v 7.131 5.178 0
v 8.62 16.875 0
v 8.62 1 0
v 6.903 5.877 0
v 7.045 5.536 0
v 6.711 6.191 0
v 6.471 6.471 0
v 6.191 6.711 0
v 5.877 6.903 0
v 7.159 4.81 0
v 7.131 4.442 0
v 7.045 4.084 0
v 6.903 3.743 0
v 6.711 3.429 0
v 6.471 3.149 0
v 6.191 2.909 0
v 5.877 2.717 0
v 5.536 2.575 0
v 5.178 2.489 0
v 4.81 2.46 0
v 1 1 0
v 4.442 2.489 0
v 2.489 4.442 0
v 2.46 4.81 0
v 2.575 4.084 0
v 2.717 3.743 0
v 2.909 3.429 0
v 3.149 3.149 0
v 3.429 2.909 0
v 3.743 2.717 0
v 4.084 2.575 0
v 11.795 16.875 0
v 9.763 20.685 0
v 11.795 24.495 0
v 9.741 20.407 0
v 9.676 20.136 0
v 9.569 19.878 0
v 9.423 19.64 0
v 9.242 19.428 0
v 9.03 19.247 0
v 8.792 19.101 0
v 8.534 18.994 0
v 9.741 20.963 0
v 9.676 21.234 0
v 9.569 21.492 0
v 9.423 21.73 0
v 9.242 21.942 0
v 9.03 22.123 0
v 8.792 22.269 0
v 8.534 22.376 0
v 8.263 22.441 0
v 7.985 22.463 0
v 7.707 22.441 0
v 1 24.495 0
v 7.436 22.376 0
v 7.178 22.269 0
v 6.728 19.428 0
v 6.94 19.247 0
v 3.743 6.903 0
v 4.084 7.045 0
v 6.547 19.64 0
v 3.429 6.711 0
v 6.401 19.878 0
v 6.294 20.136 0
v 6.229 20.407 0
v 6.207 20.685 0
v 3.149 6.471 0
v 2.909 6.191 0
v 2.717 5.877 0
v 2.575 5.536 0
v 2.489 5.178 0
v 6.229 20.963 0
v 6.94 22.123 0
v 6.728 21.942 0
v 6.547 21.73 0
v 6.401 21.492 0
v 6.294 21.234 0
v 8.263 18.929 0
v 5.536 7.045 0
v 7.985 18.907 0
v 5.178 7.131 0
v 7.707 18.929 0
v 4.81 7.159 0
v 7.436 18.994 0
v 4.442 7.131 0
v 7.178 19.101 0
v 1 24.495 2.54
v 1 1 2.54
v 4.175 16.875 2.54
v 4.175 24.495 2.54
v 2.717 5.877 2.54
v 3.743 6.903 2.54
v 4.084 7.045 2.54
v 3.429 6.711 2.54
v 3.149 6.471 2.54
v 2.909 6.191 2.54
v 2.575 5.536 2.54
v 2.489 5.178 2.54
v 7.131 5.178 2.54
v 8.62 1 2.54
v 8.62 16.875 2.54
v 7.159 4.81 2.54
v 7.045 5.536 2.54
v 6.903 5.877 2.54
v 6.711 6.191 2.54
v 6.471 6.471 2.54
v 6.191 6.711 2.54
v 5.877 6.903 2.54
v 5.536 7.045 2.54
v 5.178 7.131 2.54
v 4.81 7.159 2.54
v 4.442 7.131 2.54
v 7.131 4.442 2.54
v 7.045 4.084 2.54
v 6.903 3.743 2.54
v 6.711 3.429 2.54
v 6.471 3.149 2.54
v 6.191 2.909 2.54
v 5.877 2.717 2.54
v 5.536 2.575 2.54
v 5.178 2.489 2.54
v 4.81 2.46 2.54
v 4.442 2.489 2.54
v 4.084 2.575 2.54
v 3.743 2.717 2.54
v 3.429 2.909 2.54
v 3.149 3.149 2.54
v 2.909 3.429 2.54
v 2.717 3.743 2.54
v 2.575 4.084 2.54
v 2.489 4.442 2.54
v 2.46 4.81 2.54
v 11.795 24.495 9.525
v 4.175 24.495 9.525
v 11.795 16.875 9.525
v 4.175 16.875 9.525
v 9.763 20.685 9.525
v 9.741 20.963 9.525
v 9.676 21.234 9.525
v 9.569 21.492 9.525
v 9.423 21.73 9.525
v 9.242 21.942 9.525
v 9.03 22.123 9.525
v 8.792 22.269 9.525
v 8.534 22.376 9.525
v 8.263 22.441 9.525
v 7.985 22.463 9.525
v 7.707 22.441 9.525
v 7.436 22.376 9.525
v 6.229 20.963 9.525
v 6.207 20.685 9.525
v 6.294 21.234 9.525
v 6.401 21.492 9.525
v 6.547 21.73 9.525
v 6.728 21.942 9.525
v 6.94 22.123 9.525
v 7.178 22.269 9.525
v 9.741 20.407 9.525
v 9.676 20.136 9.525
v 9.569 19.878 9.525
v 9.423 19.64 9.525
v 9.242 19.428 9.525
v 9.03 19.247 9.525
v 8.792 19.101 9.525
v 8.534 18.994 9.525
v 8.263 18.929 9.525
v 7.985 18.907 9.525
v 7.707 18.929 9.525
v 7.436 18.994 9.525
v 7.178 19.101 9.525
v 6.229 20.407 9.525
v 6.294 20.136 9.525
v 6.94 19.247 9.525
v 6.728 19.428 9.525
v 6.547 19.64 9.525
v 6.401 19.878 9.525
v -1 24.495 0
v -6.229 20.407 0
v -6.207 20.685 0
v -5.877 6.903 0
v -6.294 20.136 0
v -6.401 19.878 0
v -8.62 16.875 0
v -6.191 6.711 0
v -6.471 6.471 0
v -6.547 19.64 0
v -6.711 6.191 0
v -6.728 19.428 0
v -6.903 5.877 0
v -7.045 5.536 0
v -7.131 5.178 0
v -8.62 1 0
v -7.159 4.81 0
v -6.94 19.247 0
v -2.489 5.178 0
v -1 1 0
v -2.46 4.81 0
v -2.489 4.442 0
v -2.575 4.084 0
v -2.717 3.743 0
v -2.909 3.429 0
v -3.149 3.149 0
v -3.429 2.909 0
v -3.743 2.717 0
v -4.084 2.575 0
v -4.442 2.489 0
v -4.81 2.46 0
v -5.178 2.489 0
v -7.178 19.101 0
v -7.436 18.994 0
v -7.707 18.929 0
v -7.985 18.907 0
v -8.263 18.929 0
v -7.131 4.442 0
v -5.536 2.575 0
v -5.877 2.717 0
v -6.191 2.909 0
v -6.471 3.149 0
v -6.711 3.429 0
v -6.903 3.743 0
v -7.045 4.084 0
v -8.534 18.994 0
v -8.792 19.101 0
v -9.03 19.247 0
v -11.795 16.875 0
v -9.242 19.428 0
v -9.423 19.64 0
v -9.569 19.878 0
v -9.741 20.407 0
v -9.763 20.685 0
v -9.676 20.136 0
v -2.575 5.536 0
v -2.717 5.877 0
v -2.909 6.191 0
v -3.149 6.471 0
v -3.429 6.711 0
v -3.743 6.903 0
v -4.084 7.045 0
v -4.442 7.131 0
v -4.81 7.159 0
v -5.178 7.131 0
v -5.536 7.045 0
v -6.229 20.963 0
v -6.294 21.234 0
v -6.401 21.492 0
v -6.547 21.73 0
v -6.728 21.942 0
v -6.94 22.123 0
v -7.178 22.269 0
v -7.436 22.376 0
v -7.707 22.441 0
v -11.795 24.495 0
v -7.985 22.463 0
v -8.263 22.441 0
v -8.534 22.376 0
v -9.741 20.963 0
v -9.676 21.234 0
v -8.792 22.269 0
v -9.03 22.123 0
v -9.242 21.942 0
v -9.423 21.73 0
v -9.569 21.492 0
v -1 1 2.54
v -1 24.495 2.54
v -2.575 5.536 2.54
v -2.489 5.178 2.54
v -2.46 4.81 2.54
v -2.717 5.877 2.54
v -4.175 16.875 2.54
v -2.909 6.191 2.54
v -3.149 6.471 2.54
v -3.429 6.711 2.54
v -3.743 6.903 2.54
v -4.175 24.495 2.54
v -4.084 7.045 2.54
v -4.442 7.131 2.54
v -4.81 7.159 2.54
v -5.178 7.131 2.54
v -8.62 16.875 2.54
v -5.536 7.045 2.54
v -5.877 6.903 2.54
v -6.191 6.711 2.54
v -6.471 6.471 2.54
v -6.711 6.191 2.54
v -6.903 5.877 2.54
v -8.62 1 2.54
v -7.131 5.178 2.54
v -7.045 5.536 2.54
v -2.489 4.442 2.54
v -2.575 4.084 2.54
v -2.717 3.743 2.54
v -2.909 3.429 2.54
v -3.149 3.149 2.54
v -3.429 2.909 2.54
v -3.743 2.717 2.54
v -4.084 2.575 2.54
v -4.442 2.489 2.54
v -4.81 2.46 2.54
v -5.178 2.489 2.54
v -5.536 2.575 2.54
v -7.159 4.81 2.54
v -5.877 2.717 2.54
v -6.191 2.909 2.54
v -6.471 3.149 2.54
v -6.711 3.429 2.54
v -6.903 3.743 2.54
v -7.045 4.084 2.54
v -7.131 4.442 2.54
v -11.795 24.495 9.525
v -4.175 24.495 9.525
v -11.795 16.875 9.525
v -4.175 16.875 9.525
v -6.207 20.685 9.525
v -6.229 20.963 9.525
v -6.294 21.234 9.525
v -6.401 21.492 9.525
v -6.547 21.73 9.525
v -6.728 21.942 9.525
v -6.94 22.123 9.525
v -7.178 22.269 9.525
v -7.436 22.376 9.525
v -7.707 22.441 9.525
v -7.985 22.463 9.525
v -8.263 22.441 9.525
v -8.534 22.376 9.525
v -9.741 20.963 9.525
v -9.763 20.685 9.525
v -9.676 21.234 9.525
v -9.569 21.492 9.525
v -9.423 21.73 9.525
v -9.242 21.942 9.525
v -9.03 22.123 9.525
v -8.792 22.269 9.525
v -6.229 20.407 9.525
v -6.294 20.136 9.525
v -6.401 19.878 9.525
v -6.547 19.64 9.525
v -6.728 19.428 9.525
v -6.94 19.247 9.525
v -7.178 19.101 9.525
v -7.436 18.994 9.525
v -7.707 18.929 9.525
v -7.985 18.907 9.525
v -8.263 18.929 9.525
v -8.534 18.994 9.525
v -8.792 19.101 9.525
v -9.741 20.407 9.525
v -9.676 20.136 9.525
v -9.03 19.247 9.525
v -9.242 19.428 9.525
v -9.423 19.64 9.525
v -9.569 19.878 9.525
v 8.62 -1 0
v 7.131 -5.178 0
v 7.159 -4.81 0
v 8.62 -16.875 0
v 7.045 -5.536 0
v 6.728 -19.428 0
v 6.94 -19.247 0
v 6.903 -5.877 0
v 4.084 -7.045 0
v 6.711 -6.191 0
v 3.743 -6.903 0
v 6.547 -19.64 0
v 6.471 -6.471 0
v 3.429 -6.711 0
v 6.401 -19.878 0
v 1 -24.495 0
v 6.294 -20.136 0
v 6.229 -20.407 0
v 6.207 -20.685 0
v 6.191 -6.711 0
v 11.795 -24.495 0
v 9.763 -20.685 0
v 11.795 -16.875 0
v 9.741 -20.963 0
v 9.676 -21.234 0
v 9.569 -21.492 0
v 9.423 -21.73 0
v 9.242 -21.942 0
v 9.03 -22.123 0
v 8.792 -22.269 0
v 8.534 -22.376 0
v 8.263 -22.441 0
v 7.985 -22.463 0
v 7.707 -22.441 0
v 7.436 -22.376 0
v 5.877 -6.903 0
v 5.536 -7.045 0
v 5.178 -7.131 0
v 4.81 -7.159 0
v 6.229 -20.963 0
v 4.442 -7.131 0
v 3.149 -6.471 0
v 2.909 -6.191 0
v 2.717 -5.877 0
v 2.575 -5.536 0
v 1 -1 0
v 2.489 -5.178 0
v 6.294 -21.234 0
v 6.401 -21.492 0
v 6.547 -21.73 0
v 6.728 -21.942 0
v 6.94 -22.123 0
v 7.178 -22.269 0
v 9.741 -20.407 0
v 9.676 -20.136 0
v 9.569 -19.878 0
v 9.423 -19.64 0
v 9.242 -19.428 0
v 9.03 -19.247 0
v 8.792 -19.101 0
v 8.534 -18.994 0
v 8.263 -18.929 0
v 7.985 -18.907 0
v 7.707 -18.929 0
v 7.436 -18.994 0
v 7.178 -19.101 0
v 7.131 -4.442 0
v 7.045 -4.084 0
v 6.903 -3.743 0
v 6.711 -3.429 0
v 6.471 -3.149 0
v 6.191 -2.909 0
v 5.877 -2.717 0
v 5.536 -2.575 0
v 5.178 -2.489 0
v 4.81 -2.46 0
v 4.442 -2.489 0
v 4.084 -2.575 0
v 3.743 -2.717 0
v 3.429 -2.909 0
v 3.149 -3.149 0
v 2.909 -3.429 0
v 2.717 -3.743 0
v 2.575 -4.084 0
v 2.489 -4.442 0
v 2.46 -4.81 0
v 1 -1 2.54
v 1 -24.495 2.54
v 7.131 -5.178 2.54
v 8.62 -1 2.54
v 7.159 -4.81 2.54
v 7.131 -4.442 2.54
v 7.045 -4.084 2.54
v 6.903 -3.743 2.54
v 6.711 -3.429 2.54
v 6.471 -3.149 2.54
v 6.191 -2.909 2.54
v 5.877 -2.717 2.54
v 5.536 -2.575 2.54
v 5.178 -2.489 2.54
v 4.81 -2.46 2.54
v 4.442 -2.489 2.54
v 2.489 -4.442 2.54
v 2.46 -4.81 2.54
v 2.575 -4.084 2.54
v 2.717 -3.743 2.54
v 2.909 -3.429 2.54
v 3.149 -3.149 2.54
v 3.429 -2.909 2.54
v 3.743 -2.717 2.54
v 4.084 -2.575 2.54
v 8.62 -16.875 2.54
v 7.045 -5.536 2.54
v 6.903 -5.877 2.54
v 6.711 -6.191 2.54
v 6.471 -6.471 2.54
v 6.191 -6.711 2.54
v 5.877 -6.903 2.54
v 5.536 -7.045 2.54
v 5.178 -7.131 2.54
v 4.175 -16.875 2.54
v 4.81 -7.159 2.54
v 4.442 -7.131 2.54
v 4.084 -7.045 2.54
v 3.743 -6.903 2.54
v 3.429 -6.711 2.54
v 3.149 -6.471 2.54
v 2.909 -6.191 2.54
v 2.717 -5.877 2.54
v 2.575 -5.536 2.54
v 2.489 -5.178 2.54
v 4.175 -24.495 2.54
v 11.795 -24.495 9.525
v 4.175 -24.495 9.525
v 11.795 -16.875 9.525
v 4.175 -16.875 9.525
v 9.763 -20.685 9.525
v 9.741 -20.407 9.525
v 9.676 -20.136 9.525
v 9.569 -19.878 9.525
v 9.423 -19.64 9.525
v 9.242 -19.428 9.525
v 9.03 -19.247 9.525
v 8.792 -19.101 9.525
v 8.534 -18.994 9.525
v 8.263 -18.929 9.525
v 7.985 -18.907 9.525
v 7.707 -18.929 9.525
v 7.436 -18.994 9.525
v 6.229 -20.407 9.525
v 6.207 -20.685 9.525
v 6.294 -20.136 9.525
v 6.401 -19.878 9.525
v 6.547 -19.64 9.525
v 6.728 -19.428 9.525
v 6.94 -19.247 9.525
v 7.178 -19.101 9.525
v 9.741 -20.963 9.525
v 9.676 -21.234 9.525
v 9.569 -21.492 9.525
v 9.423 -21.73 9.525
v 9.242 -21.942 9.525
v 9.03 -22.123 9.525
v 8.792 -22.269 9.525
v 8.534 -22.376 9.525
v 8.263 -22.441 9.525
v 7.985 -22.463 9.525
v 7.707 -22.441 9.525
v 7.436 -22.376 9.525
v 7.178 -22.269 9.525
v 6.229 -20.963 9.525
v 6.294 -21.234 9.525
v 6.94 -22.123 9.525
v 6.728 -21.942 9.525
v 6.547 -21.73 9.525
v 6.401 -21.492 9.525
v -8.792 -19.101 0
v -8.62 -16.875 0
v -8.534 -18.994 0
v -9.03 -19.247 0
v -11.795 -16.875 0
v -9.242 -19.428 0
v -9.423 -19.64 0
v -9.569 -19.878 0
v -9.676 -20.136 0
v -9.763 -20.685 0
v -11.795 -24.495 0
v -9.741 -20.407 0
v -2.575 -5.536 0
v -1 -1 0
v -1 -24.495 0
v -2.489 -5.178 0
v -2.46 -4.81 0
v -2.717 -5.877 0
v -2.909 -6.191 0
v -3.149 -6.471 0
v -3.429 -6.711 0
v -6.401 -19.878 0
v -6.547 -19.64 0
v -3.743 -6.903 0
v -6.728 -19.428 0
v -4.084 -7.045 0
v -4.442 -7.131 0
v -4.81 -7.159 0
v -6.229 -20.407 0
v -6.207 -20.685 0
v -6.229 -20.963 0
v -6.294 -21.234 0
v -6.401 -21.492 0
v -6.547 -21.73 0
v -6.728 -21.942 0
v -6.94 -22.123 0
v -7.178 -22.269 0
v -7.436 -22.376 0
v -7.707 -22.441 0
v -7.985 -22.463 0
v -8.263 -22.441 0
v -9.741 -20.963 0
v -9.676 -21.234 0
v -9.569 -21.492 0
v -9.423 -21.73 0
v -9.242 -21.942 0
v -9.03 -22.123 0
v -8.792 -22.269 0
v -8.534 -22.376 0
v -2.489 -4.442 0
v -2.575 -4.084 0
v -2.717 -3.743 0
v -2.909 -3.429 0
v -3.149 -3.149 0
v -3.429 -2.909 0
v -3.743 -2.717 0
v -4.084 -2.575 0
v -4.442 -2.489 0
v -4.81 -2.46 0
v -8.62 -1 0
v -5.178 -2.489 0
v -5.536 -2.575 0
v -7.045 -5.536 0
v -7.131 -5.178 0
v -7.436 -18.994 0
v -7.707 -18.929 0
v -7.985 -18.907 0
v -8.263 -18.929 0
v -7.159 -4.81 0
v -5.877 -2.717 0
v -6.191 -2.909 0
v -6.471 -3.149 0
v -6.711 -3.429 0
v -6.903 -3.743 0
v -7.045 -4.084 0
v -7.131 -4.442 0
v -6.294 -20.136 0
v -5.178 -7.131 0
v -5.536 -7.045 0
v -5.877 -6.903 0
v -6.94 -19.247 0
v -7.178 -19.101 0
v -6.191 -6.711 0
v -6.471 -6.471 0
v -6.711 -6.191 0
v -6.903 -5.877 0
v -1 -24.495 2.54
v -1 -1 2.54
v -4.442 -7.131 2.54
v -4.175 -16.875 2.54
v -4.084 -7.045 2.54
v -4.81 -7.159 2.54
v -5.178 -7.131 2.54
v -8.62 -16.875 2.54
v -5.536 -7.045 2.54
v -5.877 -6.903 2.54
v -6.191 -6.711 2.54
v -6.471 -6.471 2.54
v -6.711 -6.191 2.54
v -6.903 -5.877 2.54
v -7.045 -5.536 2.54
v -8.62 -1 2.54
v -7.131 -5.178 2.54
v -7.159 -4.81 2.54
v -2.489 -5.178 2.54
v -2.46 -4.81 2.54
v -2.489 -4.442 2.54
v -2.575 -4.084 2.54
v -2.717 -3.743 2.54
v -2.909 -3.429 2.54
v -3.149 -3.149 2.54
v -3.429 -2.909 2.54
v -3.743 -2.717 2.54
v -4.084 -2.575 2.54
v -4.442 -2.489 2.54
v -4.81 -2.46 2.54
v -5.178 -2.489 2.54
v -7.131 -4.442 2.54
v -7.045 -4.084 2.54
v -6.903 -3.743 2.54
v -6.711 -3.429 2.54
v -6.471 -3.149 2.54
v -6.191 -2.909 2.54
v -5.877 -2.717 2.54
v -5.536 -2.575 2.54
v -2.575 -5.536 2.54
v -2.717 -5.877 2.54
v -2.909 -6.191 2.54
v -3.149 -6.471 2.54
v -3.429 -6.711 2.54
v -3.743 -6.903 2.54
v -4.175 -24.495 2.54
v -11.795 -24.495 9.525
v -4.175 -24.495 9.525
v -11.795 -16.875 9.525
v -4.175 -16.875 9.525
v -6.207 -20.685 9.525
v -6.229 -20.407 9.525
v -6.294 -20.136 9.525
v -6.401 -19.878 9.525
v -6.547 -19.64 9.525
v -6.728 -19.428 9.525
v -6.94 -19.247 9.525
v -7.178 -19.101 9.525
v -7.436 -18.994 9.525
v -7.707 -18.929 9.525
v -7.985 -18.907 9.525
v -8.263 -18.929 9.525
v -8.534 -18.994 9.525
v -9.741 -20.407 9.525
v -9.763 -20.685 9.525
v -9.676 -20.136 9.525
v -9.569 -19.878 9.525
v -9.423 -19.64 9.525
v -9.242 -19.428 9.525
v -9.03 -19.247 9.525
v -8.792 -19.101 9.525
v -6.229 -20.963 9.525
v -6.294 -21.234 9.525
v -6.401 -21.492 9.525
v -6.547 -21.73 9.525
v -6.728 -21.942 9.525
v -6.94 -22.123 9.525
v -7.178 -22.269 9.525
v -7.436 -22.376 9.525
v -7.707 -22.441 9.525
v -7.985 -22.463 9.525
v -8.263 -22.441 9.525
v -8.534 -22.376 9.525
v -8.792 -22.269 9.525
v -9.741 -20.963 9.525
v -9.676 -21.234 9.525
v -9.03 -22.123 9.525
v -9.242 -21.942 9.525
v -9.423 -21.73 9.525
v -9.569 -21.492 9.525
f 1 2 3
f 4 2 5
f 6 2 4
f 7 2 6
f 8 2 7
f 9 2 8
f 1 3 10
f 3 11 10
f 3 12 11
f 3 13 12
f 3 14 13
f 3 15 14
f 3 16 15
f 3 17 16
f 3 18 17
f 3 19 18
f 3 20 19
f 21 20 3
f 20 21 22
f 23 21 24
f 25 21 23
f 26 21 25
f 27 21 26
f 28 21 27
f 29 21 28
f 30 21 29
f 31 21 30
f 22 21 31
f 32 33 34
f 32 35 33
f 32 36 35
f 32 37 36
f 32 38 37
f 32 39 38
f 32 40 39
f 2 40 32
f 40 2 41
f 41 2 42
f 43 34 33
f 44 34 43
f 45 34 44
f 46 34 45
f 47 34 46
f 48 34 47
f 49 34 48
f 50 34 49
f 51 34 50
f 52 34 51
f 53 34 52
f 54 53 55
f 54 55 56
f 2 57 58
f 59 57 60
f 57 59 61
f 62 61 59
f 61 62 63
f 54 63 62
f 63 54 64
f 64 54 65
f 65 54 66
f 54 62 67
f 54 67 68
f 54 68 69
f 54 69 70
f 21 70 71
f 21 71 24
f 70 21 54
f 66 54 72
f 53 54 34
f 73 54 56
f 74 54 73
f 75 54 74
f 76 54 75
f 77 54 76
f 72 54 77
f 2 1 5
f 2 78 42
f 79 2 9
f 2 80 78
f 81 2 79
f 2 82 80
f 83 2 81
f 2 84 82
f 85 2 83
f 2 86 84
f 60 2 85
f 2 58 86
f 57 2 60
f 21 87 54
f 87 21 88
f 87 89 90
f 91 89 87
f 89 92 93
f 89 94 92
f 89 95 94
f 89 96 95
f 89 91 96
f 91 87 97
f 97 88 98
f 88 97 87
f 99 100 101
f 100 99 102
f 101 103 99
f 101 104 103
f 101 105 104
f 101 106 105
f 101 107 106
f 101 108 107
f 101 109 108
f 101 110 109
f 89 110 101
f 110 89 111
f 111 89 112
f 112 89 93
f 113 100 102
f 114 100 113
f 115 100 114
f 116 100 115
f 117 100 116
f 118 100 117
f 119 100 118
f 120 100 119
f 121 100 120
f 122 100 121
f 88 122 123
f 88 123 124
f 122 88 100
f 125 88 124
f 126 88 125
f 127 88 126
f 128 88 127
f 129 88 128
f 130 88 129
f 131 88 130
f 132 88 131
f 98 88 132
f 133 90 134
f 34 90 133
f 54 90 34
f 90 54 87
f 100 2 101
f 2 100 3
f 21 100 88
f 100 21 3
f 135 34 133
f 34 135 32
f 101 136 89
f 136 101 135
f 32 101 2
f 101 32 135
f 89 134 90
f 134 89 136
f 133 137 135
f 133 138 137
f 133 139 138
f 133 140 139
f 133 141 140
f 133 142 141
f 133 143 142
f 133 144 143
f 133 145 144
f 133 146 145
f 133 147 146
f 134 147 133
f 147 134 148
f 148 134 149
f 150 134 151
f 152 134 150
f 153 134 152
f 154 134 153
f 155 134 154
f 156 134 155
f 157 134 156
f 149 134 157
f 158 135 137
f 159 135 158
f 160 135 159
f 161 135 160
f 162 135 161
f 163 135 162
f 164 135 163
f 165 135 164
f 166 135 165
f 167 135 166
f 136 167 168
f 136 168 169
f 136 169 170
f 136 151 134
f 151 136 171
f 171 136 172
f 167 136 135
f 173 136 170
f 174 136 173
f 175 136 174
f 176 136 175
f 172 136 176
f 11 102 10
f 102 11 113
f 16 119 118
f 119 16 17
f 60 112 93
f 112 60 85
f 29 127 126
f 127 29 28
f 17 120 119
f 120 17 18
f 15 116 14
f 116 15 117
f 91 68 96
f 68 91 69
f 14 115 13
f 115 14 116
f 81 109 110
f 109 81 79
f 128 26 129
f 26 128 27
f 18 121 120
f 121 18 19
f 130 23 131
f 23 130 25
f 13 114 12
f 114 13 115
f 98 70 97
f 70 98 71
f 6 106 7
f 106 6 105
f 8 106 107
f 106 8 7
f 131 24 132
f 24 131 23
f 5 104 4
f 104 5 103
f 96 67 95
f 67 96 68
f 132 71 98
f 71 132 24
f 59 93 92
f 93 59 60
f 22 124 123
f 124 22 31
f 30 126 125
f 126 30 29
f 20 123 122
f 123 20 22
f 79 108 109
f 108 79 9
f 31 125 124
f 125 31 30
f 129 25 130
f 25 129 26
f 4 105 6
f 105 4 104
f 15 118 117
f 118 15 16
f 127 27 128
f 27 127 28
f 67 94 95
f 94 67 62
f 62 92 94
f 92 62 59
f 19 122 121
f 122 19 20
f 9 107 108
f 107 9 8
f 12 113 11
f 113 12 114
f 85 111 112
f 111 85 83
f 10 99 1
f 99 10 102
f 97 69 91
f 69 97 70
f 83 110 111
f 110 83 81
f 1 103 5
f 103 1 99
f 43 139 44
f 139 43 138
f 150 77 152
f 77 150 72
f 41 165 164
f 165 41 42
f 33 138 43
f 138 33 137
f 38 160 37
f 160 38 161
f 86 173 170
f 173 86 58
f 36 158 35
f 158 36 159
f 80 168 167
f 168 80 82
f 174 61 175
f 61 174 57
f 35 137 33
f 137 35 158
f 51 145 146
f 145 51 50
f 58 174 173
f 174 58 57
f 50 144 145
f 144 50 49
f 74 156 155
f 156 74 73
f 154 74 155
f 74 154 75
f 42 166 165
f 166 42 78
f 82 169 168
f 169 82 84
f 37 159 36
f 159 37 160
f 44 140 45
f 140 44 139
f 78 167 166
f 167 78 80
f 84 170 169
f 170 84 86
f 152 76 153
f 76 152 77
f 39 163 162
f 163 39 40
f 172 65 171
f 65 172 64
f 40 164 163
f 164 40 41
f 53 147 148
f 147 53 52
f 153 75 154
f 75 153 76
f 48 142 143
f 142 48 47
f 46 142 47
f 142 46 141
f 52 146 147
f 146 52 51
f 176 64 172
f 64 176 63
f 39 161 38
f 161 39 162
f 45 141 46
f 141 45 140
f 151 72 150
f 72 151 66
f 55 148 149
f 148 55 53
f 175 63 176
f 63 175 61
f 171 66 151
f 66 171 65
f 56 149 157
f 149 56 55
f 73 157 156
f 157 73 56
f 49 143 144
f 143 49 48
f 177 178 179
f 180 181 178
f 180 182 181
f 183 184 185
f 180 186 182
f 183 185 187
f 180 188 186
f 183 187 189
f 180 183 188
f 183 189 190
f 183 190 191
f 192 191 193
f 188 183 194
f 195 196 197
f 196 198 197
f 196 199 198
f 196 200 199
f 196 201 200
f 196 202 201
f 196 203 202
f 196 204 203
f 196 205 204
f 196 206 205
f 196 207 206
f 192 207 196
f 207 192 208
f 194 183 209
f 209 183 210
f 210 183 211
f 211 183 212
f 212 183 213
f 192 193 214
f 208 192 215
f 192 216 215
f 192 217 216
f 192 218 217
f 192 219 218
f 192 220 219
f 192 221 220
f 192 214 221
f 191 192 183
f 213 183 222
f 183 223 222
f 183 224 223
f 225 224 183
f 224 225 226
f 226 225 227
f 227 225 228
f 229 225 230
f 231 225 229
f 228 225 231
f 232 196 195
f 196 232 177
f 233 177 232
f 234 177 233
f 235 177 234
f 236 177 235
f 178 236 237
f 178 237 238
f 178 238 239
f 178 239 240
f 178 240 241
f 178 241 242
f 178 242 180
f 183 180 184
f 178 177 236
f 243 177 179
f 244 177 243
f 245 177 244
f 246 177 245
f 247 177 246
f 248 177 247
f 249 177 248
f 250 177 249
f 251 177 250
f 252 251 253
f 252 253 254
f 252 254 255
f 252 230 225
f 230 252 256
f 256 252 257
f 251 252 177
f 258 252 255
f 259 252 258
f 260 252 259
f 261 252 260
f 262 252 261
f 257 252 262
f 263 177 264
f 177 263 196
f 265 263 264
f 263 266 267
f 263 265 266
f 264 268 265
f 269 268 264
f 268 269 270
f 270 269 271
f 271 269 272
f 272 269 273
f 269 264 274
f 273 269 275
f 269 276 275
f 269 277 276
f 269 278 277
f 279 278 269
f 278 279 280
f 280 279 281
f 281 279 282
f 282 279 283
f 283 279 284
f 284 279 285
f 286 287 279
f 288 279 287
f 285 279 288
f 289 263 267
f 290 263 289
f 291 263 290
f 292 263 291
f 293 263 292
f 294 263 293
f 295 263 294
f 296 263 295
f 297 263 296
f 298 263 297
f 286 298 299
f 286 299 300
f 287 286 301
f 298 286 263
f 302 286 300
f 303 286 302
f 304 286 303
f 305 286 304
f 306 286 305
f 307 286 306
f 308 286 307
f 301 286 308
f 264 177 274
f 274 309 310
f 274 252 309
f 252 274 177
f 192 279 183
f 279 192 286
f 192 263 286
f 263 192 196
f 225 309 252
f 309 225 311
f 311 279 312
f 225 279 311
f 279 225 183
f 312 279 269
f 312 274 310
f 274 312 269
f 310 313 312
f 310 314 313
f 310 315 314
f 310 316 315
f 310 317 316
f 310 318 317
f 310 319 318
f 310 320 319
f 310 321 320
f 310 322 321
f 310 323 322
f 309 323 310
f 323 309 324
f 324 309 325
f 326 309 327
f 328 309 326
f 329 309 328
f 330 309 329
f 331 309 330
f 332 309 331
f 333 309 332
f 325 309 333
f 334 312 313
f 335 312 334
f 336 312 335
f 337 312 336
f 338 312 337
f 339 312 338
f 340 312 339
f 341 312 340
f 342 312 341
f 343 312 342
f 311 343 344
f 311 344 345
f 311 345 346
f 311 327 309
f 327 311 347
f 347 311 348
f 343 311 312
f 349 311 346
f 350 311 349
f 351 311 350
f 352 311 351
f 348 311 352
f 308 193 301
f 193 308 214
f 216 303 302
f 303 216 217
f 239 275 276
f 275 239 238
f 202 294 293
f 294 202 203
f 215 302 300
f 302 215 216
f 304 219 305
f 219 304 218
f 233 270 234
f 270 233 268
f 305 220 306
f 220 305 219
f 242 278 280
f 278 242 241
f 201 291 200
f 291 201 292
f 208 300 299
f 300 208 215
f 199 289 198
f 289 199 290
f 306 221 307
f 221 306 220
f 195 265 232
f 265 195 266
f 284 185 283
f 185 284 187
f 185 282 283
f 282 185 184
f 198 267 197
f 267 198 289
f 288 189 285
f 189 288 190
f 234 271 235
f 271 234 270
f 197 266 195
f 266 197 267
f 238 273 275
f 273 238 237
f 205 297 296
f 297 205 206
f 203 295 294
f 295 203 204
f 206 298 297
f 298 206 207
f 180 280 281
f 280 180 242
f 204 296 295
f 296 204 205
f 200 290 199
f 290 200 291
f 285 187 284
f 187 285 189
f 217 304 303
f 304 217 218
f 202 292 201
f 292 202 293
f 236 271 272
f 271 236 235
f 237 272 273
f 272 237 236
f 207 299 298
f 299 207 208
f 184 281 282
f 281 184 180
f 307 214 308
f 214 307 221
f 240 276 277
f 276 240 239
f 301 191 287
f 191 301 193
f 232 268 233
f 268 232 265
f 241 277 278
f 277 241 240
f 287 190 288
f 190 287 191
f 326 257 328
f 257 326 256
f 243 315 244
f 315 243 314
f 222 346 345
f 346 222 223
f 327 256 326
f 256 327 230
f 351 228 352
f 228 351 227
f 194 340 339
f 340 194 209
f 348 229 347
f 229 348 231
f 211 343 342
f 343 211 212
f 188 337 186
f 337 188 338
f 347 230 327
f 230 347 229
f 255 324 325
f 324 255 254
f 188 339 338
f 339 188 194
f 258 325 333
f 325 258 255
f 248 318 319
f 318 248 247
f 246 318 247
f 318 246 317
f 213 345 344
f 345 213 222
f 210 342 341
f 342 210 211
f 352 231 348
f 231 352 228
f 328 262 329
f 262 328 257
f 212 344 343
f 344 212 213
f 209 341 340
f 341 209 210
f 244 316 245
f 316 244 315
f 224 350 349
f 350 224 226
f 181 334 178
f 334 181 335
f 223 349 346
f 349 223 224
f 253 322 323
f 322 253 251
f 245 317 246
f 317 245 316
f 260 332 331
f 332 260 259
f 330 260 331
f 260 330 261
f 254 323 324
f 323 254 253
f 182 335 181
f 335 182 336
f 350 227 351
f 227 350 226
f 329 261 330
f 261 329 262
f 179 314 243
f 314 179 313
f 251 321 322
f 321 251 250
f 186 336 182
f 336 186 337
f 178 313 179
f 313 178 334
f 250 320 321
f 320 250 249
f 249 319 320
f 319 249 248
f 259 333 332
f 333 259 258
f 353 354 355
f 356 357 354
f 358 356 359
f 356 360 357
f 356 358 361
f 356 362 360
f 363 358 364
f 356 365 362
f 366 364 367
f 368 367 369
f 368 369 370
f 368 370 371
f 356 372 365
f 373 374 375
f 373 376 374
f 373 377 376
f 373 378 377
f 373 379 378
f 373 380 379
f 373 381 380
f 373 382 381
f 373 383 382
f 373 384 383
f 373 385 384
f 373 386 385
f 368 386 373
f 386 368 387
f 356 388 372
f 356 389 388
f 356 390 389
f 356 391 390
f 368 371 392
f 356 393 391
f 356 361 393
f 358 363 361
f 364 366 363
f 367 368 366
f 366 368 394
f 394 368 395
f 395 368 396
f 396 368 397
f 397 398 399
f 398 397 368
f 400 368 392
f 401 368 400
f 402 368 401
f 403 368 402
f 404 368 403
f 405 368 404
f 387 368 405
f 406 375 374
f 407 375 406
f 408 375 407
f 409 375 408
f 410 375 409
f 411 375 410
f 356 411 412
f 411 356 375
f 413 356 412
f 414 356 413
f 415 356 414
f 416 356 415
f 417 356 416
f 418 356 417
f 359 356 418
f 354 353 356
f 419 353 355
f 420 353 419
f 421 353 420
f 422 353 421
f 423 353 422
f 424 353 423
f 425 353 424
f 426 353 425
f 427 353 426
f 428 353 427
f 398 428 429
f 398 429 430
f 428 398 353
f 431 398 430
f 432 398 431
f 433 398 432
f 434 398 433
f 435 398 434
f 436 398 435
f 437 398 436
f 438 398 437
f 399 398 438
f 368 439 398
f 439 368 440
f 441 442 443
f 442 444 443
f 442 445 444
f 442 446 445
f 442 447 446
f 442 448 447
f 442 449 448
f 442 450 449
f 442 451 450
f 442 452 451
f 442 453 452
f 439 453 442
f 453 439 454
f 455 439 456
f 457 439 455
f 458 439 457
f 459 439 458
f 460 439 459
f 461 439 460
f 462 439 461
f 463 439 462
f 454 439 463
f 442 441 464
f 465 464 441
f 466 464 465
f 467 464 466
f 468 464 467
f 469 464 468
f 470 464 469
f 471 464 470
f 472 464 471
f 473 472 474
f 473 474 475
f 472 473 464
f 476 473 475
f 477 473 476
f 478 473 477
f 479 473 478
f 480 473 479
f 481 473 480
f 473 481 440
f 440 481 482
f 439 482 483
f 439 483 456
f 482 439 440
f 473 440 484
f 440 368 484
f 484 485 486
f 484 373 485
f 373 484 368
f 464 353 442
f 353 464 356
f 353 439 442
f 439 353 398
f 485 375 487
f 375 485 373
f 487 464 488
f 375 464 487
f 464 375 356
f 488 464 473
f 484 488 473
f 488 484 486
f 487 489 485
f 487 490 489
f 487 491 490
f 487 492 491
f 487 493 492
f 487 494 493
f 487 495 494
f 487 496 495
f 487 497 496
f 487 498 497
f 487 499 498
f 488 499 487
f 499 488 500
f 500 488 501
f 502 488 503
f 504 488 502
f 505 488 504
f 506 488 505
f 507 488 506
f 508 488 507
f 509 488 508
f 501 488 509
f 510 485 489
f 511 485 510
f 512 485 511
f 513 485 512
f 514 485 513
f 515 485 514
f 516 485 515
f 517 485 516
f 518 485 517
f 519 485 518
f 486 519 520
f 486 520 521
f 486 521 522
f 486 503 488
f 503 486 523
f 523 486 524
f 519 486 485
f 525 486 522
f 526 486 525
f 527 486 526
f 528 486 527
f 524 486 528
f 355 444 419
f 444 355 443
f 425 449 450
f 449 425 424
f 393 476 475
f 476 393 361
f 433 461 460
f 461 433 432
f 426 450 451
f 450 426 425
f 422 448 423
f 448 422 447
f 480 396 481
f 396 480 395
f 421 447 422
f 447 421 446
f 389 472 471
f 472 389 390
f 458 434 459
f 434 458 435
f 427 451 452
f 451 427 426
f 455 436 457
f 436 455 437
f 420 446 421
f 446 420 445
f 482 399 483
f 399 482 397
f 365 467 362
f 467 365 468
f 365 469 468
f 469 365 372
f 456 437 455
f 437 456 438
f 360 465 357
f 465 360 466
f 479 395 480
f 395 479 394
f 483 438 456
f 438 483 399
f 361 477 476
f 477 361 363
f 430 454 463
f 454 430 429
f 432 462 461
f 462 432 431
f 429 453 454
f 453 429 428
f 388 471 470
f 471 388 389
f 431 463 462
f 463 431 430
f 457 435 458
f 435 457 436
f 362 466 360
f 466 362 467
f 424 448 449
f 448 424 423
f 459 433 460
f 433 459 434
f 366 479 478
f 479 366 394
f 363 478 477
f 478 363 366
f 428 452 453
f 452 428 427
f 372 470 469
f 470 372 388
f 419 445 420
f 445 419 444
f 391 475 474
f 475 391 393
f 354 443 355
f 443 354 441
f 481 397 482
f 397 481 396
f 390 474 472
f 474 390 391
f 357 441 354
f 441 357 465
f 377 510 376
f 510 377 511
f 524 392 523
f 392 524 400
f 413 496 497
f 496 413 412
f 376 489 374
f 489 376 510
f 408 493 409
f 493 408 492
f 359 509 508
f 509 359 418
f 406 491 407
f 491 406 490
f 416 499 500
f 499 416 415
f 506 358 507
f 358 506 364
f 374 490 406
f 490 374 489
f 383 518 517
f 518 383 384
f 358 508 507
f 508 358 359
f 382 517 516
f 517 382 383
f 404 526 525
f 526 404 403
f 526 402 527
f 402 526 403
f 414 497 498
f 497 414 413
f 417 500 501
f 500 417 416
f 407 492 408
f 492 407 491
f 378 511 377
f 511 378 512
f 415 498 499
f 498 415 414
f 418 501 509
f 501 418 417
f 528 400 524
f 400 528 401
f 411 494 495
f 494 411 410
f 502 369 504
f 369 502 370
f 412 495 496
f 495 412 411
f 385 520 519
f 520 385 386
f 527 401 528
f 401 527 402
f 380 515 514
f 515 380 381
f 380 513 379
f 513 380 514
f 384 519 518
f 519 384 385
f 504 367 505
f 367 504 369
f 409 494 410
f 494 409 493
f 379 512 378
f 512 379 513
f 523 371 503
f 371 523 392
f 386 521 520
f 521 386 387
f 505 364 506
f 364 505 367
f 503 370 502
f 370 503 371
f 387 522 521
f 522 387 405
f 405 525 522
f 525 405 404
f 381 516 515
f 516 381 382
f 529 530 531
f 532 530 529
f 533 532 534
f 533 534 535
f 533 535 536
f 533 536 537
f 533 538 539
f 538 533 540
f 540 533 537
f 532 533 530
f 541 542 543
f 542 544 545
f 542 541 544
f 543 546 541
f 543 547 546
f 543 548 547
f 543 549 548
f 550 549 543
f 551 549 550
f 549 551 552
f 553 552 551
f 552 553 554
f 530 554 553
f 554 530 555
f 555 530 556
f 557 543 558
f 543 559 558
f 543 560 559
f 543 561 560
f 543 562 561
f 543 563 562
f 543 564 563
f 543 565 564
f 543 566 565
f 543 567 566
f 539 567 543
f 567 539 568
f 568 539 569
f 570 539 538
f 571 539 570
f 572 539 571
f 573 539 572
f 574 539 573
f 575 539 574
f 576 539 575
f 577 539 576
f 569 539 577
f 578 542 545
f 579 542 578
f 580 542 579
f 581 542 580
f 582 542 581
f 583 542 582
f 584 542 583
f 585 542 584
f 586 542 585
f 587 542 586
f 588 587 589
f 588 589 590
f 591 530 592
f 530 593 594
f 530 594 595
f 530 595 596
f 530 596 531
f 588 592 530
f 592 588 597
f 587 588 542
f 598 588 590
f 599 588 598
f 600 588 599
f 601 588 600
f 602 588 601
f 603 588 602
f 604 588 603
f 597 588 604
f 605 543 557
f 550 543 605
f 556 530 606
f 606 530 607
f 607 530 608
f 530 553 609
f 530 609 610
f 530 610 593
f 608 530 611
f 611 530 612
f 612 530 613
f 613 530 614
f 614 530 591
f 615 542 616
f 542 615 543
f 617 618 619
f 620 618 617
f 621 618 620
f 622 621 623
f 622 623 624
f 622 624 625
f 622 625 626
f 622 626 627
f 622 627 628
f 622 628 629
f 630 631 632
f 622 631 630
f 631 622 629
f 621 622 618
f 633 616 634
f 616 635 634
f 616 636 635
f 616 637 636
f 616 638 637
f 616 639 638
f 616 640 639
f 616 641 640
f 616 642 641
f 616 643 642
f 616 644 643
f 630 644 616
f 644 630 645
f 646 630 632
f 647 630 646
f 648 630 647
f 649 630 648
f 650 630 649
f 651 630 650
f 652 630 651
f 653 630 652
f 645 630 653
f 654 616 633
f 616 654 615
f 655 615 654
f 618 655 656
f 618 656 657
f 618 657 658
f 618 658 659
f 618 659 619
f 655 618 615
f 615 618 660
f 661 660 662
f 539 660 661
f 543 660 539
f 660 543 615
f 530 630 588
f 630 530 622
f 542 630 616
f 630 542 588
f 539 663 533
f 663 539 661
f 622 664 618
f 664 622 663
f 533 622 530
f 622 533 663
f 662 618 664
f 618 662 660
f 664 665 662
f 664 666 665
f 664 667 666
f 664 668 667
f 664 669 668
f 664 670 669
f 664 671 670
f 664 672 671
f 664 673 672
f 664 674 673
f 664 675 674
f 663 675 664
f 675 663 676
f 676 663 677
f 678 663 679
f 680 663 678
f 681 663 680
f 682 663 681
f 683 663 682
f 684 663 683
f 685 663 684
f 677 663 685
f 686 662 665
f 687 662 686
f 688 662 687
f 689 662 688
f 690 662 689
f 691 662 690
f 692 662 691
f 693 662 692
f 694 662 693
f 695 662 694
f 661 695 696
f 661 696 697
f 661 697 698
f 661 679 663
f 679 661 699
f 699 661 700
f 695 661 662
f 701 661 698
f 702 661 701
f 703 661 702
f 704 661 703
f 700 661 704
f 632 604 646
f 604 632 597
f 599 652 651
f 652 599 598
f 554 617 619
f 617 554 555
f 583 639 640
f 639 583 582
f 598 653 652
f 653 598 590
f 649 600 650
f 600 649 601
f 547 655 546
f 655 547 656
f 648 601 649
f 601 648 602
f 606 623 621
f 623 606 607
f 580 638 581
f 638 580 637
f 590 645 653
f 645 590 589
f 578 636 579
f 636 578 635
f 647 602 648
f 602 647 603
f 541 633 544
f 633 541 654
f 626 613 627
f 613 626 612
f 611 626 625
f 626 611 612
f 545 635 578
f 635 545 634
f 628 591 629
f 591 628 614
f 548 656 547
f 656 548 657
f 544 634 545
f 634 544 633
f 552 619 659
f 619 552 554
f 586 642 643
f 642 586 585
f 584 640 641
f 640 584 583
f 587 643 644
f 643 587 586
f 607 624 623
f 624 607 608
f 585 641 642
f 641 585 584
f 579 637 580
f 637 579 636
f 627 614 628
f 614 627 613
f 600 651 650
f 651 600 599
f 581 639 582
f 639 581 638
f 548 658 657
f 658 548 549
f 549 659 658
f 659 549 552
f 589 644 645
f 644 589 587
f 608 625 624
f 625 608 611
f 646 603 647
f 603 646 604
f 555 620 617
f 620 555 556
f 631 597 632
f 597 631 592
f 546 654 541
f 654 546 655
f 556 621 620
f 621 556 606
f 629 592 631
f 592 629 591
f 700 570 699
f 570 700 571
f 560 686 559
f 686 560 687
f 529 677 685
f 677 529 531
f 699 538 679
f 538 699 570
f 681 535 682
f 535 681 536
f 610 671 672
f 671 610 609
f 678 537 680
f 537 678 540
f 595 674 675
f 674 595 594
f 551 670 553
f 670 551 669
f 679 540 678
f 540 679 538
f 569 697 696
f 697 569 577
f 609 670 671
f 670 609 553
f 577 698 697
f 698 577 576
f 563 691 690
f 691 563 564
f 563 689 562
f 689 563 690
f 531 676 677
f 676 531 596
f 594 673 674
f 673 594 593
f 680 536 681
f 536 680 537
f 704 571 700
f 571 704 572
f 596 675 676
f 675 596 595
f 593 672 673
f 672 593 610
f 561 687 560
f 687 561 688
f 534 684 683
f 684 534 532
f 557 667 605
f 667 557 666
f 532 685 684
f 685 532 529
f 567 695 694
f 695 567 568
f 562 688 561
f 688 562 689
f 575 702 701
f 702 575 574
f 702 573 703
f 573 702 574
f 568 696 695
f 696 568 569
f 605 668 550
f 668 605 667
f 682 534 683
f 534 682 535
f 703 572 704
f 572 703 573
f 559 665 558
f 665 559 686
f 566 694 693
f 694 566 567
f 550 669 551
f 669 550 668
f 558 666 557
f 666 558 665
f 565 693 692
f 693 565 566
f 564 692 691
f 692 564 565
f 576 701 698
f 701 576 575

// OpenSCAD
$fn = 40;

inches_to_mm = 25.4;

hole_1_diameter = 0.185*inches_to_mm;
hole_2_diameter = 0.140*inches_to_mm;
dx_h1h2_center = 1/8*inches_to_mm;
dy_h1h2_center = 5/8*inches_to_mm;
spacer_width = 0.3*inches_to_mm;
spacer_thickness = 0.1*inches_to_mm;
standoff_thickness = 0.375*inches_to_mm;

translate([1,1,0]) bracket_1();
translate([-1,1,0]) bracket_2();
translate([1,-1,0]) bracket_3();
translate([-1,-1,0]) bracket_4();
               

module bracket_1()
{
  difference()
  {
    union()
    {
      // A
      linear_extrude(height=spacer_thickness) square([spacer_width,dy_h1h2_center+spacer_width]);
      // B
      linear_extrude(height=spacer_thickness) translate([0,dy_h1h2_center]) square([dx_h1h2_center+spacer_width,spacer_width]);
      // C
      linear_extrude(height=standoff_thickness) translate([dx_h1h2_center,dy_h1h2_center]) square([spacer_width,spacer_width]);
    }



    translate([0,0,-1]) linear_extrude(height=spacer_thickness+2) translate([spacer_width/2,spacer_width/2]) circle(r=hole_1_diameter/2);
    translate([0,0,-1]) linear_extrude(height=standoff_thickness+2) translate([dx_h1h2_center+spacer_width/2,dy_h1h2_center+spacer_width/2]) circle(r=hole_2_diameter/2);
  }
}

module bracket_2()
{
  multmatrix(m = [ [-1, 0, 0, 0],
		  [0, 1, 0, 0],
		  [0, 0, 1, 0],
		  [0, 0, 0, 1]
		]) bracket_1();
}

module bracket_3()
{
  multmatrix(m = [ [1, 0, 0, 0],
		  [0, -1, 0, 0],
		  [0, 0, 1, 0],
		  [0, 0, 0, 1]
		]) bracket_1();
}

module bracket_4()
{
  multmatrix(m = [ [-1, 0, 0, 0],
		  [0, -1, 0, 0],
		  [0, 0, 1, 0],
		  [0, 0, 0, 1]
		]) bracket_1();
}
